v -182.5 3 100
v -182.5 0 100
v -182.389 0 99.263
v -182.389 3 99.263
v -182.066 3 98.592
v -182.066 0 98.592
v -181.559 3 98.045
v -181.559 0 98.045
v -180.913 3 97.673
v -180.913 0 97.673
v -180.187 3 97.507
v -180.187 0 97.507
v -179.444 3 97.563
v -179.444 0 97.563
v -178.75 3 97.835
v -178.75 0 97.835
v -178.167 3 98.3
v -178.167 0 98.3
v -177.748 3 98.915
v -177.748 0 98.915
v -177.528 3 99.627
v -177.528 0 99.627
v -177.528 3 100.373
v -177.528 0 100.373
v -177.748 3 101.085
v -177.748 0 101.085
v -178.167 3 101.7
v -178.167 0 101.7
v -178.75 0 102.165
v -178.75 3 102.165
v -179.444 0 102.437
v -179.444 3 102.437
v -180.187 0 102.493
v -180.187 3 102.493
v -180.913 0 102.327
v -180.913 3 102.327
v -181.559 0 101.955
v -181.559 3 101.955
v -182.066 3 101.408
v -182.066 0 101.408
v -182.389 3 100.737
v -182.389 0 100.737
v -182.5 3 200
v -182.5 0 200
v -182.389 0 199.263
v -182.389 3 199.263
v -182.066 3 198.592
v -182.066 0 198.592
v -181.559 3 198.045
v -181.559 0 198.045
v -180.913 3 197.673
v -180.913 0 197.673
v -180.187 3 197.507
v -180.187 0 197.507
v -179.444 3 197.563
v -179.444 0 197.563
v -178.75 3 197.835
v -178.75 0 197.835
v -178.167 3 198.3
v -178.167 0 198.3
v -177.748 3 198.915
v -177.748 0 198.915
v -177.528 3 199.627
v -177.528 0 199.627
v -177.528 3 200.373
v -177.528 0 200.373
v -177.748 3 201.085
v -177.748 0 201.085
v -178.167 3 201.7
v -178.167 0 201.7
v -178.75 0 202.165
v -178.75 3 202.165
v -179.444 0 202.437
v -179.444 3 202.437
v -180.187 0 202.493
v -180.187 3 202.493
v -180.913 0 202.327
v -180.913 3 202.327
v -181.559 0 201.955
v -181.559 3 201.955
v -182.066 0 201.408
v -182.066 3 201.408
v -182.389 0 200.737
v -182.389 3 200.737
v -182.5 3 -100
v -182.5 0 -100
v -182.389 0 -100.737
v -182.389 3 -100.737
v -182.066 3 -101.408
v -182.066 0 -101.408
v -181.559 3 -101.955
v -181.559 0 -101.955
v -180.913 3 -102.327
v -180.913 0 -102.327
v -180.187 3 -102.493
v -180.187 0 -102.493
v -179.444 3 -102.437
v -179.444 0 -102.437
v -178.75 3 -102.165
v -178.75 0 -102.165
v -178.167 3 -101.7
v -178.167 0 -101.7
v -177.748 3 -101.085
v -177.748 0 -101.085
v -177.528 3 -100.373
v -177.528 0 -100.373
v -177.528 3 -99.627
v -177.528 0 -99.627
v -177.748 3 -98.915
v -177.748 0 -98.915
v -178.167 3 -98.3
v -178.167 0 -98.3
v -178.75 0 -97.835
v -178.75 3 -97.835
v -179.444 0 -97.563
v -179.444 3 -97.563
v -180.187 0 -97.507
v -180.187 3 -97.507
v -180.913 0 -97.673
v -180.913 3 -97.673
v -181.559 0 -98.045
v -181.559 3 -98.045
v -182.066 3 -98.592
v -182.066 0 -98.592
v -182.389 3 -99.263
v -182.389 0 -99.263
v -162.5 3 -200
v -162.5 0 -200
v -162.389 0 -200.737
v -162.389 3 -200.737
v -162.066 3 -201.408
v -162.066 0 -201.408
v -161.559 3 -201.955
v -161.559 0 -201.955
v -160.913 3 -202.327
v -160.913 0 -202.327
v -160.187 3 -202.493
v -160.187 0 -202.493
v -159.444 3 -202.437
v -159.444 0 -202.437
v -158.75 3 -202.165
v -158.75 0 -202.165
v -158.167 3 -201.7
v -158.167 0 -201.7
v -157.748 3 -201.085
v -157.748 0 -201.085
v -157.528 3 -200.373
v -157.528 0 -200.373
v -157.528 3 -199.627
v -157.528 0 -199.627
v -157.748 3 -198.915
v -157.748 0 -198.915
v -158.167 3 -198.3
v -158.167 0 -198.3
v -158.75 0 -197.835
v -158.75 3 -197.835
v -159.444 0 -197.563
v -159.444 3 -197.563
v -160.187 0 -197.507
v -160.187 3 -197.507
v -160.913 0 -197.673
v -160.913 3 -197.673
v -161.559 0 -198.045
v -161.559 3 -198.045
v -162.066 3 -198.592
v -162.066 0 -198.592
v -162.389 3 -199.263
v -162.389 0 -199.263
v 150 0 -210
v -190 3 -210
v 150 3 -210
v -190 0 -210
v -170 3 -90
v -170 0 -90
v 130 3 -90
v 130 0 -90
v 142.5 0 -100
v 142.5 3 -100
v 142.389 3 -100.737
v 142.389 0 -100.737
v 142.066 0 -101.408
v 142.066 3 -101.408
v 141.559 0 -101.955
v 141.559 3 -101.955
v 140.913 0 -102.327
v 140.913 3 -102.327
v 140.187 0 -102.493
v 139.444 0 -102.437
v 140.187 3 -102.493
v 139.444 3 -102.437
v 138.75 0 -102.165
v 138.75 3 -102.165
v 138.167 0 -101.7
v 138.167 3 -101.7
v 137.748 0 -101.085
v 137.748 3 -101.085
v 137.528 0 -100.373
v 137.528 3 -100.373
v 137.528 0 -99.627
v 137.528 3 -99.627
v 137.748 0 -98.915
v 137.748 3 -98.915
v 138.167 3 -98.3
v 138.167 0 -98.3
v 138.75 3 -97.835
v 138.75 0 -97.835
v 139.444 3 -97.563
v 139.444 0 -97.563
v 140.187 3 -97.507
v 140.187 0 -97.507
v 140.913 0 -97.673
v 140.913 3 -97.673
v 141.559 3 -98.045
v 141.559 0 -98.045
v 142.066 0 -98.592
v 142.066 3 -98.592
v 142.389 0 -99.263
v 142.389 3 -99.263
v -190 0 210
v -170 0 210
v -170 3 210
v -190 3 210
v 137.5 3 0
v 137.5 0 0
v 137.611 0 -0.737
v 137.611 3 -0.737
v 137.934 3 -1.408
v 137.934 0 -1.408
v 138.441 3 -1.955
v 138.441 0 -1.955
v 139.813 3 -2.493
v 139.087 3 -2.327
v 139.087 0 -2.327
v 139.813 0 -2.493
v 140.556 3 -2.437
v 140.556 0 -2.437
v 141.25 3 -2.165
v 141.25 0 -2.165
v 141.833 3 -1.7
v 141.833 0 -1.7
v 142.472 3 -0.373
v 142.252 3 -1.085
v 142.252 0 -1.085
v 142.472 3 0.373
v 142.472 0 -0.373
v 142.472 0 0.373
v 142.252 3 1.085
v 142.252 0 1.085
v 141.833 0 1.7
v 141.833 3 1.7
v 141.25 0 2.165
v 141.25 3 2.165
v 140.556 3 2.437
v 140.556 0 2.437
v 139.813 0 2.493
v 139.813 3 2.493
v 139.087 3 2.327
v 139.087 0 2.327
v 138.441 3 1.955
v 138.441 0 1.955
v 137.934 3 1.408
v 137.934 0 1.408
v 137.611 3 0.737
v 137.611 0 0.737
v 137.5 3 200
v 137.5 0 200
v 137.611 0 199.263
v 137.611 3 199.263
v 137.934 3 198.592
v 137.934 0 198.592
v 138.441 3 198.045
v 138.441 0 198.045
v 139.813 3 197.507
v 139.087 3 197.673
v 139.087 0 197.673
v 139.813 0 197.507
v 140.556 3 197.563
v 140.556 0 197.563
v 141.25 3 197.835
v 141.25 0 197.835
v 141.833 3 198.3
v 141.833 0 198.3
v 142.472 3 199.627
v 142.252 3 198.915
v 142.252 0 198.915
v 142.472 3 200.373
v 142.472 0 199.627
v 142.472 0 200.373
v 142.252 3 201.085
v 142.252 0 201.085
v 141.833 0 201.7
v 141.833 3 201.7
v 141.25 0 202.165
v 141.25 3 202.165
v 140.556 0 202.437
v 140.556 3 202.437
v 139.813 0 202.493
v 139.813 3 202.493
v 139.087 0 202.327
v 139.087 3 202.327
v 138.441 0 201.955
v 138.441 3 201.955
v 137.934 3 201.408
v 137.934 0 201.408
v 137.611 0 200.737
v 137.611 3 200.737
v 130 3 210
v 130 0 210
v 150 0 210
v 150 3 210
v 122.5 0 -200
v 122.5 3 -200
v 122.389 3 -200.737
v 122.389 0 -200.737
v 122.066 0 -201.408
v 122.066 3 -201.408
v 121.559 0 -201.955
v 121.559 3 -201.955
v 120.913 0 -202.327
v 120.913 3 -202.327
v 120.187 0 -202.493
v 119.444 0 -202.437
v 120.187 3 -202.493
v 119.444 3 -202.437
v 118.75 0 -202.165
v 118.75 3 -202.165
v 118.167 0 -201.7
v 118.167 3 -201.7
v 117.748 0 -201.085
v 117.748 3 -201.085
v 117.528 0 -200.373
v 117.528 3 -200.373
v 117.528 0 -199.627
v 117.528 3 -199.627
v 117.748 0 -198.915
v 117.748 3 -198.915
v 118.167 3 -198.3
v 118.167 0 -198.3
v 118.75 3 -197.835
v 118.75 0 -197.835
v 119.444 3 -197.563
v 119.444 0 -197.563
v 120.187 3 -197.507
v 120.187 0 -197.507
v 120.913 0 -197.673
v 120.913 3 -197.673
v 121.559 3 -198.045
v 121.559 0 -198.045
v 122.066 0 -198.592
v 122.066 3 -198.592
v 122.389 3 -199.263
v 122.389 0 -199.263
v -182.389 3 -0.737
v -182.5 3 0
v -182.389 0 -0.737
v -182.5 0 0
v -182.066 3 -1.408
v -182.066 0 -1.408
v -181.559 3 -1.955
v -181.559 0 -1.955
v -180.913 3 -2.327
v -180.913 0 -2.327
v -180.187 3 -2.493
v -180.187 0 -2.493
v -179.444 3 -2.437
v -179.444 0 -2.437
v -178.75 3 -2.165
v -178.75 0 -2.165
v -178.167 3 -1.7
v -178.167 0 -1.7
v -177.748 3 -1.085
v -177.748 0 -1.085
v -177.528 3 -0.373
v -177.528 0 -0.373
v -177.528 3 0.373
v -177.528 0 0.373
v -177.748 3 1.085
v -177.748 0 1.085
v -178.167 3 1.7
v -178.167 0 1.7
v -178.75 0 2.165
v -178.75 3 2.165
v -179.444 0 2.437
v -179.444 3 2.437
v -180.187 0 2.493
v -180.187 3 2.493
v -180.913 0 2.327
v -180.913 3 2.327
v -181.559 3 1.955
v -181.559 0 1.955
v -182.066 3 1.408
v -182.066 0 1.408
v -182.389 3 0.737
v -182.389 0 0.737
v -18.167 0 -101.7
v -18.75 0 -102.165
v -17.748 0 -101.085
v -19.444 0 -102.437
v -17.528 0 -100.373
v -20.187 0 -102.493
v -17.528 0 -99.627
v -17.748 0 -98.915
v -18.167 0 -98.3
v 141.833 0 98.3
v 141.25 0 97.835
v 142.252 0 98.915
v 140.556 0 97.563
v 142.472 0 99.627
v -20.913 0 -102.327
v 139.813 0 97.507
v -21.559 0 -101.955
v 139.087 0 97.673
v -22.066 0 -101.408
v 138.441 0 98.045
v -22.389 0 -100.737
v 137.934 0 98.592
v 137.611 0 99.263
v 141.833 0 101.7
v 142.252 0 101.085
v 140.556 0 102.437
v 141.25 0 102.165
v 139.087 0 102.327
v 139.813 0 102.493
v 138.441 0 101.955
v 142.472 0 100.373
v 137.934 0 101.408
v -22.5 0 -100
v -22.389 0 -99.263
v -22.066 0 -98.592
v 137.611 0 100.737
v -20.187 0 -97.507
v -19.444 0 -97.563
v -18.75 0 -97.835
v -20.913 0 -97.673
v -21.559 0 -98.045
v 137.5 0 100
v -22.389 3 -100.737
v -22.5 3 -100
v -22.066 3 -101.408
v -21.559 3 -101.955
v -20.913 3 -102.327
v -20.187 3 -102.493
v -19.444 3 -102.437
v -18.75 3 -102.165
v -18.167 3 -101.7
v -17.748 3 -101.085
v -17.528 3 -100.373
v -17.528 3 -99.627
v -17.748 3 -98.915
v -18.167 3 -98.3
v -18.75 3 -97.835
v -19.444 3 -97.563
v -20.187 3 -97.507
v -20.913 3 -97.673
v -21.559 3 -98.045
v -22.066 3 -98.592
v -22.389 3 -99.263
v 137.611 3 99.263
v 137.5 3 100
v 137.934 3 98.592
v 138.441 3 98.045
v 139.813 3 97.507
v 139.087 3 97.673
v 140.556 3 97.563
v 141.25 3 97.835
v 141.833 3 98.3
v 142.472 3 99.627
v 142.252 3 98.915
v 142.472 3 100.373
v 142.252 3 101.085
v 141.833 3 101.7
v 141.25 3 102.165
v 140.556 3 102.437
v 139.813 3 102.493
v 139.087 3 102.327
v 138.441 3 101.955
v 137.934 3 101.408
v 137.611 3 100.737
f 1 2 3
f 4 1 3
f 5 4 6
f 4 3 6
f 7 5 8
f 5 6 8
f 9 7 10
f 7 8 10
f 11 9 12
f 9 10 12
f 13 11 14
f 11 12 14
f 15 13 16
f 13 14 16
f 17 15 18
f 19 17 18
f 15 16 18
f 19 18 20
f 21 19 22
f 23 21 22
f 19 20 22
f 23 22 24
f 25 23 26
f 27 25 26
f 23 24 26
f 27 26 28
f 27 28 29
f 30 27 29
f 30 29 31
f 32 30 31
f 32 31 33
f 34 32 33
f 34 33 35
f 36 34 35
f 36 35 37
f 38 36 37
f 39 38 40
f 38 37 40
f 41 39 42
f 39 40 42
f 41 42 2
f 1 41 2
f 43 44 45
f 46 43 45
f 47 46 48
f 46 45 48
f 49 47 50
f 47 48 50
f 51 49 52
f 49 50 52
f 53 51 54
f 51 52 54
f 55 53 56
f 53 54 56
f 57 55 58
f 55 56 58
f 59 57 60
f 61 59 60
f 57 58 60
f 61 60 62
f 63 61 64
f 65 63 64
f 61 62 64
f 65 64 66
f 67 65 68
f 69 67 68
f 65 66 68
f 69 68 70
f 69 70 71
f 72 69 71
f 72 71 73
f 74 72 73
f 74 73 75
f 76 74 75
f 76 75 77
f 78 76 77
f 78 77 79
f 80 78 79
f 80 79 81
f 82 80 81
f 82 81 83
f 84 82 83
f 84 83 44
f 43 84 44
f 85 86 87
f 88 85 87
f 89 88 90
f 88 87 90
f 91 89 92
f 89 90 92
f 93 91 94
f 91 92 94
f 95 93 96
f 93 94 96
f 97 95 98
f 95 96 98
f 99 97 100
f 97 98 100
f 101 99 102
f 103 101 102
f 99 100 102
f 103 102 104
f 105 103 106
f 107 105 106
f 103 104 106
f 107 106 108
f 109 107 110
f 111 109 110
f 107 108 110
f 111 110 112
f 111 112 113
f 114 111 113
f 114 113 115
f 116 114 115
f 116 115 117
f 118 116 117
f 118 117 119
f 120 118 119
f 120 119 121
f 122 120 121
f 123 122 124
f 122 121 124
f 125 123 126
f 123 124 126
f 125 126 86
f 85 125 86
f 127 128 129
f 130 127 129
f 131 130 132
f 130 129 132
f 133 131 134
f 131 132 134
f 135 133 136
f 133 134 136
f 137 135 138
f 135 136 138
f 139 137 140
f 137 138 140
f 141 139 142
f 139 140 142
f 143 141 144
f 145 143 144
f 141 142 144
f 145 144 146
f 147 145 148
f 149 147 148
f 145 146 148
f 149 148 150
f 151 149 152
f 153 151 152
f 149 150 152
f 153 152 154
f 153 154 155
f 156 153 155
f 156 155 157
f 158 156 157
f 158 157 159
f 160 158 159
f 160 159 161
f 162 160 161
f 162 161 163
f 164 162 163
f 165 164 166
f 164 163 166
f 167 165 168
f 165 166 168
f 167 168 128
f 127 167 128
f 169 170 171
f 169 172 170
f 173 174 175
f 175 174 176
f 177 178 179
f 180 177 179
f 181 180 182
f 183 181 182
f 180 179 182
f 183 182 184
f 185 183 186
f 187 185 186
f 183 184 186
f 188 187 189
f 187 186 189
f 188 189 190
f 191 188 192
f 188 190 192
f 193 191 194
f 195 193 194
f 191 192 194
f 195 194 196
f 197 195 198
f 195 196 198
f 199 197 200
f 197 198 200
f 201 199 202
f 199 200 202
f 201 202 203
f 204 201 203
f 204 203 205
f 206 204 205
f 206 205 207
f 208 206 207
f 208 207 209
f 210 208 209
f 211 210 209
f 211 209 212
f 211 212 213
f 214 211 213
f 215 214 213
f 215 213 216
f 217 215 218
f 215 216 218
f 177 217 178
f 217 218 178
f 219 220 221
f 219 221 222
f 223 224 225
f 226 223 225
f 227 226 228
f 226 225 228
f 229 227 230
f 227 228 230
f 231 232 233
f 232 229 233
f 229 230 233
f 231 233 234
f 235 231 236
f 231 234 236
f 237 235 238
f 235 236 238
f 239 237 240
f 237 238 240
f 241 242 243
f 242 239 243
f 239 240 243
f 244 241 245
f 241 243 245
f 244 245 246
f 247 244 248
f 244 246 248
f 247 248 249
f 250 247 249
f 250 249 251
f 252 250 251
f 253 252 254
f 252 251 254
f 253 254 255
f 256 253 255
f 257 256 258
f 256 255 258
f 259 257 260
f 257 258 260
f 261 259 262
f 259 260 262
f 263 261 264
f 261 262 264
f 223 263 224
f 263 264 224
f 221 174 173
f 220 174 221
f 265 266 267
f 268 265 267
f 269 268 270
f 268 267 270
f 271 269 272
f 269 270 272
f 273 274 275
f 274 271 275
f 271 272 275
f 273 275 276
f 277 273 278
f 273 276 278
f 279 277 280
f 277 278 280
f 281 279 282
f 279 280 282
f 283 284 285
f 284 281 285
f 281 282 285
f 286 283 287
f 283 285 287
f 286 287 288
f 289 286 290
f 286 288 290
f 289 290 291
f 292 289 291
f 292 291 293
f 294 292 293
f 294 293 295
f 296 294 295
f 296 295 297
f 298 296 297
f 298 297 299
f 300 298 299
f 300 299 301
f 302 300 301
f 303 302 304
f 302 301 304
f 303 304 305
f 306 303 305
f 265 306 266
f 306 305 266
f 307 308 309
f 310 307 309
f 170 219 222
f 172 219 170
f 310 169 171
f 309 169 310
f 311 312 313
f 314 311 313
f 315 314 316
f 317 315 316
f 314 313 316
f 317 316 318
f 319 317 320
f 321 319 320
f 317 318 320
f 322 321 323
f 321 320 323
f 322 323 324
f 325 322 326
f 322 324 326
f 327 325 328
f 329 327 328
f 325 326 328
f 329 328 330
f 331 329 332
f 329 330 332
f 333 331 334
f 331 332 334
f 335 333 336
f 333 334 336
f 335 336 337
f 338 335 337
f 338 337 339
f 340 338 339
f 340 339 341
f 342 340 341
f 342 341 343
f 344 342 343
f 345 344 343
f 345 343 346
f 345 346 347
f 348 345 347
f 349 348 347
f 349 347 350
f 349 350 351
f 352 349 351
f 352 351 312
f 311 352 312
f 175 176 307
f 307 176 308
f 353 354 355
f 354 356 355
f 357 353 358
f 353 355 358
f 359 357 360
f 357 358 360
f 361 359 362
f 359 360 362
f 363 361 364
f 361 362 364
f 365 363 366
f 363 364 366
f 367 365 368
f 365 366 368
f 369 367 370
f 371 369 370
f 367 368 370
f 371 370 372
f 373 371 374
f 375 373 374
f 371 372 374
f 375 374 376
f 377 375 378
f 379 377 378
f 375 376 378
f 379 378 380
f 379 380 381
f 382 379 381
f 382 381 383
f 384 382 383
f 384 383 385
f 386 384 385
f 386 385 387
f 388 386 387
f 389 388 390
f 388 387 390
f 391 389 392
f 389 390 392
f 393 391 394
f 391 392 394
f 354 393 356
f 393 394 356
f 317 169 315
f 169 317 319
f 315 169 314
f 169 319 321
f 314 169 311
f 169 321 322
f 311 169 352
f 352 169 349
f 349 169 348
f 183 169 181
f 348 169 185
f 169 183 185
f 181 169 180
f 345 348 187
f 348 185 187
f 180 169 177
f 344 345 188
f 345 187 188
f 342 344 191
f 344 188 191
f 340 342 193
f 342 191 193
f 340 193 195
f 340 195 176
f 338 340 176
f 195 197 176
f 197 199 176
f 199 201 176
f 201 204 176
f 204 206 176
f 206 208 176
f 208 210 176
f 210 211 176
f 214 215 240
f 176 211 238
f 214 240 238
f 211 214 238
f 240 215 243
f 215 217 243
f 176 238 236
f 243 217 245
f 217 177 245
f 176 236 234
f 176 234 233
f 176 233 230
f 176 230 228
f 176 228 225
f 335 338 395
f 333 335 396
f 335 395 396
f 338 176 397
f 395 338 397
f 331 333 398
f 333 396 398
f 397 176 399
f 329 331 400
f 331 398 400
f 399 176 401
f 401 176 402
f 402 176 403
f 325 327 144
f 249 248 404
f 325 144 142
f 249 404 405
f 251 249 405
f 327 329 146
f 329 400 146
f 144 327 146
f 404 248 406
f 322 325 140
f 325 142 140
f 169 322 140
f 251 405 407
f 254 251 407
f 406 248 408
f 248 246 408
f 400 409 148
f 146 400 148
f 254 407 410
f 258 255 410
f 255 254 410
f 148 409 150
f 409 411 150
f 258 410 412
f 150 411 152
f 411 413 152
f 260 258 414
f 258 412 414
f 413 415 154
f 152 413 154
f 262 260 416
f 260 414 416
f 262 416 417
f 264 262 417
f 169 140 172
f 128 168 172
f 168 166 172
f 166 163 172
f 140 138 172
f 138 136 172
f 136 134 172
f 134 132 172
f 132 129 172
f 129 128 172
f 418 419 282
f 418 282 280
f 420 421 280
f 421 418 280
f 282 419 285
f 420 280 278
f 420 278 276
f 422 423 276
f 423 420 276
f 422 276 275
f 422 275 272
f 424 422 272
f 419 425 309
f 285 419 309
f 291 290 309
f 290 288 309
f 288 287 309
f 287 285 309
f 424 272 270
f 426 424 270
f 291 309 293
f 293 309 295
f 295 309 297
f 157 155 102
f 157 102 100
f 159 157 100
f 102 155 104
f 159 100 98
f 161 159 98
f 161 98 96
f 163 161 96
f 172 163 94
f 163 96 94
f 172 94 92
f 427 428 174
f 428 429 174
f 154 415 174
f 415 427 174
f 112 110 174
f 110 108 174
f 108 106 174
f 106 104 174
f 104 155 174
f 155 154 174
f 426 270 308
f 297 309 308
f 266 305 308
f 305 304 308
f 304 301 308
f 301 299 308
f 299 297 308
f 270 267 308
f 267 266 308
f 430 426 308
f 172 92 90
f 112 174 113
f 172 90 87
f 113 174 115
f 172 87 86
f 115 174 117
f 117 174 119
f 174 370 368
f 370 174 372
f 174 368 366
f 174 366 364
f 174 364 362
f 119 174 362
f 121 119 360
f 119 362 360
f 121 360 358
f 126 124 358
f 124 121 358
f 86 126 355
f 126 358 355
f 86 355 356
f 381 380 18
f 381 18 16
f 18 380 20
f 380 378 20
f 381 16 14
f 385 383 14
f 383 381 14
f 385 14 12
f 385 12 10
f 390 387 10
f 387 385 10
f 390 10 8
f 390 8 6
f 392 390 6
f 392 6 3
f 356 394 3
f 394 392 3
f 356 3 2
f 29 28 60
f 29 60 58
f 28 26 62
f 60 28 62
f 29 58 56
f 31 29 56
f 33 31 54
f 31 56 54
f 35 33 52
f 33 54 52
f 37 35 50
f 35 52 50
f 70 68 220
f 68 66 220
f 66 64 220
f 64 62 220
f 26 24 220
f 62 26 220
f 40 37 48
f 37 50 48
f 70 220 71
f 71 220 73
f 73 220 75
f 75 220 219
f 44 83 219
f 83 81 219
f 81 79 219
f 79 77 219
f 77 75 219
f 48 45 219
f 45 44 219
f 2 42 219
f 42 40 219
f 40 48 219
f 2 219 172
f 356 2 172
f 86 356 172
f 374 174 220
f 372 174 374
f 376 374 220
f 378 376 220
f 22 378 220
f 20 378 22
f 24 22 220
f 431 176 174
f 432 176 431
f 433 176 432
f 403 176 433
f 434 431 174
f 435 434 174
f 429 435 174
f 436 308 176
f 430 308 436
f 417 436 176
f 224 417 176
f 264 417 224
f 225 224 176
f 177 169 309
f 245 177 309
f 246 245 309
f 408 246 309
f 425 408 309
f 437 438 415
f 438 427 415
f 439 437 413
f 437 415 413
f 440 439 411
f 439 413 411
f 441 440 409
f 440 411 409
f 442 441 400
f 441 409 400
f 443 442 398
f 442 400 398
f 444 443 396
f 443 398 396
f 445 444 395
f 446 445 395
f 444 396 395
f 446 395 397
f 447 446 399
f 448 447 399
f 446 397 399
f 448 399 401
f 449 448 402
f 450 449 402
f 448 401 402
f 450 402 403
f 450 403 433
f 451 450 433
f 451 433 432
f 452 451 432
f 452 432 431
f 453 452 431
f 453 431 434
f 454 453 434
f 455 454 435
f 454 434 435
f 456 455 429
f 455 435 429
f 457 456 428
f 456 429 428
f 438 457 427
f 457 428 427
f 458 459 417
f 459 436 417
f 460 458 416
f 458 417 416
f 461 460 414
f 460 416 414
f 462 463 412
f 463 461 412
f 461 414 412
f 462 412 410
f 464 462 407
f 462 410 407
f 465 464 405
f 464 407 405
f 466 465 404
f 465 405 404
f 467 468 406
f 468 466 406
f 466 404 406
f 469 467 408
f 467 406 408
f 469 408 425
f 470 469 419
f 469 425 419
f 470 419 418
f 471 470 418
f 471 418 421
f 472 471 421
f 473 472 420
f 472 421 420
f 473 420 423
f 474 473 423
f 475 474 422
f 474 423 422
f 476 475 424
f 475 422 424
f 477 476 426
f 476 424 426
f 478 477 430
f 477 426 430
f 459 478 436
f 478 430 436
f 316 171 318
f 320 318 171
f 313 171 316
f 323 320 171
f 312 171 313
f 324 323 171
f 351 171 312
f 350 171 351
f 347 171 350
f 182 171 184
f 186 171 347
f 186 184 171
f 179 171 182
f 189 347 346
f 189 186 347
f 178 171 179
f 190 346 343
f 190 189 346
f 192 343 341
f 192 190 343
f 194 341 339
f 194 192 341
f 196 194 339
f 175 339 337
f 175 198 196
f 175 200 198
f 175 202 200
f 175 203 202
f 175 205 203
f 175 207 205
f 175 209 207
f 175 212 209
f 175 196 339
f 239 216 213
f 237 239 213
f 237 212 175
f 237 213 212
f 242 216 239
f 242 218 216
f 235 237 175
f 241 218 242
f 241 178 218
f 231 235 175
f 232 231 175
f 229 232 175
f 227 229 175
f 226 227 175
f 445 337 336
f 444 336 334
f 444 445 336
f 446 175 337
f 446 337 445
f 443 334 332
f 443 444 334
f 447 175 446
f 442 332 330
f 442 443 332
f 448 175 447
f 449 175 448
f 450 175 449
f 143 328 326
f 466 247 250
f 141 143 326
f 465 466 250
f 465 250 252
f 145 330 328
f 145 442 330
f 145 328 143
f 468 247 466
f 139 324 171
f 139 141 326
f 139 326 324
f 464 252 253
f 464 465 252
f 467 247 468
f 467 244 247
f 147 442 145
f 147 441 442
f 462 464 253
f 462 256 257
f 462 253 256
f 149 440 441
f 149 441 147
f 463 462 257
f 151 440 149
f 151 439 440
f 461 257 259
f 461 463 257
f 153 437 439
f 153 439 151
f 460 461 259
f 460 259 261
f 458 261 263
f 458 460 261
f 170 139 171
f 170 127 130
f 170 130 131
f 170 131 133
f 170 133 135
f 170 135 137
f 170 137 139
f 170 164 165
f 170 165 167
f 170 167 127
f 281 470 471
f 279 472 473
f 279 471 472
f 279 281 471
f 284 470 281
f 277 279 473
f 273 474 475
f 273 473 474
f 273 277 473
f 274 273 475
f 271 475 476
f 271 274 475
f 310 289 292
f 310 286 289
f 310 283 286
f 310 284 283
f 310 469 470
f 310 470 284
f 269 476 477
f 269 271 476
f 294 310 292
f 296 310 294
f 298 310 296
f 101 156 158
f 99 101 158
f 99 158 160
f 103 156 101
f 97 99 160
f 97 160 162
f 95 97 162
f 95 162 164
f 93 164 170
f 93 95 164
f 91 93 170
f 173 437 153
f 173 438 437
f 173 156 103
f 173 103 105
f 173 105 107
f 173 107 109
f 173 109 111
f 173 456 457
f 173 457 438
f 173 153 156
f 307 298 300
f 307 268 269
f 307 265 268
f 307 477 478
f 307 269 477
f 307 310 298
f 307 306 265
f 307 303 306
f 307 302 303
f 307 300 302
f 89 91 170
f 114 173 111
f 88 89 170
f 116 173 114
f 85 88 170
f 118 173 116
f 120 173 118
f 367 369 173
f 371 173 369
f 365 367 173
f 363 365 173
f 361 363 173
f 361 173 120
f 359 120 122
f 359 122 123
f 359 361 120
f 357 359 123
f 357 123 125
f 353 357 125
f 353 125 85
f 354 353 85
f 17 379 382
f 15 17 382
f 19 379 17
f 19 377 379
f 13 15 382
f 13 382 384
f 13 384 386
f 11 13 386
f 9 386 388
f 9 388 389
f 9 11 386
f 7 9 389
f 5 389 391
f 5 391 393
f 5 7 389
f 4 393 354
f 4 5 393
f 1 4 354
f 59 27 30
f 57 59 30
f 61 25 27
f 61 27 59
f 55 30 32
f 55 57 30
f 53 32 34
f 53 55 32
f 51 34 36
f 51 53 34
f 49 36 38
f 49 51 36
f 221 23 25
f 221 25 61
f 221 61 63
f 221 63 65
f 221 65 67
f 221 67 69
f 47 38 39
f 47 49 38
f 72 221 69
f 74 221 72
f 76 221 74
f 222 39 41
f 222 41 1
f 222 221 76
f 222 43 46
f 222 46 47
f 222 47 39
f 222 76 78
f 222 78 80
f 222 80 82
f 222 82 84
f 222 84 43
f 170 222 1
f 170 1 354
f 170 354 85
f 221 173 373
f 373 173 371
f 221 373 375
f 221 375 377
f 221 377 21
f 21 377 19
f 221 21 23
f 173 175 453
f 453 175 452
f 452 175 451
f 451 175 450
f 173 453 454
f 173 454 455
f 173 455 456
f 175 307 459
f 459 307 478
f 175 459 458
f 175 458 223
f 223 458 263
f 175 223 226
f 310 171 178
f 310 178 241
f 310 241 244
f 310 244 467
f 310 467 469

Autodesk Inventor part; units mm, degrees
ref_plane "YZ Plane" through (0, 0, 0) normal (1, 0, 0) x (0, 1, 0)
ref_plane "XZ Plane" through (0, 0, 0) normal (0, 1, 0) x (-1, 0, 0)
ref_plane "XY Plane" through (0, 0, 0) normal (0, 0, 1) x (1, 0, 0)
sketch "Sketch1" plane through (0, 0, 0) normal (0, 1, 0) x (-1, 0, 0)
  line L0 (190, 210) -> (190, -210)
  line L1 (190, -210) -> (-150, -210)
  line L2 (-150, -210) -> (-150, 210)
  line L3 (-150, -190) -> (170, -190)
  line L4 (170, -190) -> (170, 190)
  line L5 (-150, -200) -> (180, -200)
  line L6 (180, -200) -> (180, 200)
  line L7 (190, -210) -> (190, -90)
  line L8 (190, -90) -> (-150, -90)
  line L9 (170, 190) -> (170, 210)
  line L10 (180, 200) -> (180, 210)
  line L11 (170, 210) -> (190, 210)
  line L12 (190, -90) -> (190, -100)
  line L13 (190, -100) -> (-150, -100)
  line L14 (190, -100) -> (190, -110)
  line L15 (190, -110) -> (-150, -110)
  circle A0 centre (180, 200) radius 2.5
  circle A1 centre (180, -100) radius 2.5
  circle A2 centre (20, -100) radius 2.5
  circle A3 centre (180, 100) radius 2.5
  circle A4 centre (180, 0) radius 2.5
  line L16 (0, 0) -> (0, 25.5231)
  circle A5 centre (160, -200) radius 2.5
  line L17 (-150, -200) -> (-140, -200)
  line L18 (-140, -200) -> (-130, -200)
  line L19 (-130, -200) -> (-130, 210)
  line L20 (-130, 210) -> (-150, 210)
  circle A6 centre (-140, -100) radius 2.5
  circle A7 centre (-140, 0) radius 2.5
  circle A8 centre (-140, 100) radius 2.5
  circle A9 centre (-140, 200) radius 2.5
  circle A10 centre (20, -200) radius 2.5
  line L21 (20, -200) -> (-120, -200)
  circle A11 centre (-120, -200) radius 2.5
  point P0 (170, -90)
  point P1 (180, -90)
  point P2 (-130, -90)
  point P3 (-130, -190)
  point P4 (180, 2.5)
  point P5 (180, -2.5)
  point P6 (180, 202.5)
  point P7 (180, 197.5)
  point P8 (180, 102.5)
  point P9 (180, 97.5)
  dimension "d0" = 340
  dimension "d1" = 420
  dimension "d2" = 20
  dimension "d3" = 10
  dimension "d4" = 120
  dimension "d5" = 10
  dimension "d6" = 10
  dimension "d7" = 5
  dimension "d9" = 5
  dimension "d11" = 5
  dimension "d12" = 5
  dimension "d13" = 5
  dimension "d15" = 5
  dimension "d25" = 10
  dimension "d26" = 10
  dimension "d27" = 5
  dimension "d30" = 5
  dimension "d31" = 140
  dimension "d32" = 5
extrude "Extrusion1" add sketch "Sketch1" along normal blind 3 contours L0 L8 L6 A4 A3 A0 L10 L11 | L0 L13 A1 L6 L8 | L10 A0 L6 A3 A4 L8 L4 L9 L11 | L0 L15 L6 A1 L13 | L6 A1 L13 L4 L8 | L0 L1 L2 L5 A11 A10 A5 L6 L15 | L4 L13 A2 L19 L8 | L15 L4 L13 A1 L6 | L6 L5 A5 A10 A11 L19 L3 L4 L15 | L4 L15 L19 L13 A2 | L19 L13 A6 L2 L8 | L8 L2 L20 L19 | L4 L3 L19 L15 | L19 L15 L2 L13 A6 | L2 L3 L19 L5 | L19 L3 L2 L15 | A6 L13 | L13 A6 | A10 L5 | L5 A10 | A11 L5 | L5 A11
sketch "Sketch3" plane through (0, 3, 0) normal (0, 1, 0) x (1, 0, 0)
  circle A0 centre (-180, -100) radius 2.5 projected
  circle A1 centre (-20, 100) radius 2.5 projected
  circle A2 centre (-160, 200) radius 2.5 projected
  circle A3 centre (-180, 100) radius 2.5 projected
  circle A4 centre (140, 0) radius 2.5 projected
  circle A5 centre (140, -100) radius 2.5 projected
  circle A6 centre (140, -200) radius 2.5 projected
  circle A7 centre (-180, -200) radius 2.5 projected
  line L0 (-190, 210) -> (-190, -210) projected
  line L1 (-190, -210) -> (-170, -210) projected
  line L2 (-170, -210) -> (-170, 90) projected
  line L3 (-170, 90) -> (130, 90) projected
  line L4 (130, 90) -> (130, -210) projected
  line L5 (130, -210) -> (150, -210) projected
  line L6 (150, -210) -> (150, 210) projected
  line L7 (150, 210) -> (-190, 210) projected
  circle A8 centre (-180, 0) radius 2.5 projected
  circle A9 centre (-20, 200) radius 2.5 projected
  circle A10 centre (120, 200) radius 2.5 projected
  circle A11 centre (-180, -100) radius 2.5 projected
  circle A12 centre (-20, 100) radius 2.5 projected
  circle A13 centre (-160, 200) radius 2.5 projected
  circle A14 centre (-180, 100) radius 2.5 projected
  circle A15 centre (140, 0) radius 2.5 projected
  circle A16 centre (140, -100) radius 2.5 projected
  circle A17 centre (140, -200) radius 2.5 projected
  circle A18 centre (-180, -200) radius 2.5 projected
  line L8 (-190, 210) -> (-190, -210) projected
  line L9 (-190, -210) -> (-170, -210) projected
  line L10 (-170, -210) -> (-170, 90) projected
  line L11 (-170, 90) -> (130, 90) projected
  line L12 (130, 90) -> (130, -210) projected
  line L13 (130, -210) -> (150, -210) projected
  line L14 (150, -210) -> (150, 210) projected
  line L15 (150, 210) -> (-190, 210) projected
  circle A19 centre (-180, 0) radius 2.5 projected
  circle A20 centre (140, 100) radius 2.5 projected
  point P0 (0, 0)
extrude "Extrusion3" cut sketch "Sketch3" against normal blind 3 contours A10 | A20
properties part number "CaraFrontal"
